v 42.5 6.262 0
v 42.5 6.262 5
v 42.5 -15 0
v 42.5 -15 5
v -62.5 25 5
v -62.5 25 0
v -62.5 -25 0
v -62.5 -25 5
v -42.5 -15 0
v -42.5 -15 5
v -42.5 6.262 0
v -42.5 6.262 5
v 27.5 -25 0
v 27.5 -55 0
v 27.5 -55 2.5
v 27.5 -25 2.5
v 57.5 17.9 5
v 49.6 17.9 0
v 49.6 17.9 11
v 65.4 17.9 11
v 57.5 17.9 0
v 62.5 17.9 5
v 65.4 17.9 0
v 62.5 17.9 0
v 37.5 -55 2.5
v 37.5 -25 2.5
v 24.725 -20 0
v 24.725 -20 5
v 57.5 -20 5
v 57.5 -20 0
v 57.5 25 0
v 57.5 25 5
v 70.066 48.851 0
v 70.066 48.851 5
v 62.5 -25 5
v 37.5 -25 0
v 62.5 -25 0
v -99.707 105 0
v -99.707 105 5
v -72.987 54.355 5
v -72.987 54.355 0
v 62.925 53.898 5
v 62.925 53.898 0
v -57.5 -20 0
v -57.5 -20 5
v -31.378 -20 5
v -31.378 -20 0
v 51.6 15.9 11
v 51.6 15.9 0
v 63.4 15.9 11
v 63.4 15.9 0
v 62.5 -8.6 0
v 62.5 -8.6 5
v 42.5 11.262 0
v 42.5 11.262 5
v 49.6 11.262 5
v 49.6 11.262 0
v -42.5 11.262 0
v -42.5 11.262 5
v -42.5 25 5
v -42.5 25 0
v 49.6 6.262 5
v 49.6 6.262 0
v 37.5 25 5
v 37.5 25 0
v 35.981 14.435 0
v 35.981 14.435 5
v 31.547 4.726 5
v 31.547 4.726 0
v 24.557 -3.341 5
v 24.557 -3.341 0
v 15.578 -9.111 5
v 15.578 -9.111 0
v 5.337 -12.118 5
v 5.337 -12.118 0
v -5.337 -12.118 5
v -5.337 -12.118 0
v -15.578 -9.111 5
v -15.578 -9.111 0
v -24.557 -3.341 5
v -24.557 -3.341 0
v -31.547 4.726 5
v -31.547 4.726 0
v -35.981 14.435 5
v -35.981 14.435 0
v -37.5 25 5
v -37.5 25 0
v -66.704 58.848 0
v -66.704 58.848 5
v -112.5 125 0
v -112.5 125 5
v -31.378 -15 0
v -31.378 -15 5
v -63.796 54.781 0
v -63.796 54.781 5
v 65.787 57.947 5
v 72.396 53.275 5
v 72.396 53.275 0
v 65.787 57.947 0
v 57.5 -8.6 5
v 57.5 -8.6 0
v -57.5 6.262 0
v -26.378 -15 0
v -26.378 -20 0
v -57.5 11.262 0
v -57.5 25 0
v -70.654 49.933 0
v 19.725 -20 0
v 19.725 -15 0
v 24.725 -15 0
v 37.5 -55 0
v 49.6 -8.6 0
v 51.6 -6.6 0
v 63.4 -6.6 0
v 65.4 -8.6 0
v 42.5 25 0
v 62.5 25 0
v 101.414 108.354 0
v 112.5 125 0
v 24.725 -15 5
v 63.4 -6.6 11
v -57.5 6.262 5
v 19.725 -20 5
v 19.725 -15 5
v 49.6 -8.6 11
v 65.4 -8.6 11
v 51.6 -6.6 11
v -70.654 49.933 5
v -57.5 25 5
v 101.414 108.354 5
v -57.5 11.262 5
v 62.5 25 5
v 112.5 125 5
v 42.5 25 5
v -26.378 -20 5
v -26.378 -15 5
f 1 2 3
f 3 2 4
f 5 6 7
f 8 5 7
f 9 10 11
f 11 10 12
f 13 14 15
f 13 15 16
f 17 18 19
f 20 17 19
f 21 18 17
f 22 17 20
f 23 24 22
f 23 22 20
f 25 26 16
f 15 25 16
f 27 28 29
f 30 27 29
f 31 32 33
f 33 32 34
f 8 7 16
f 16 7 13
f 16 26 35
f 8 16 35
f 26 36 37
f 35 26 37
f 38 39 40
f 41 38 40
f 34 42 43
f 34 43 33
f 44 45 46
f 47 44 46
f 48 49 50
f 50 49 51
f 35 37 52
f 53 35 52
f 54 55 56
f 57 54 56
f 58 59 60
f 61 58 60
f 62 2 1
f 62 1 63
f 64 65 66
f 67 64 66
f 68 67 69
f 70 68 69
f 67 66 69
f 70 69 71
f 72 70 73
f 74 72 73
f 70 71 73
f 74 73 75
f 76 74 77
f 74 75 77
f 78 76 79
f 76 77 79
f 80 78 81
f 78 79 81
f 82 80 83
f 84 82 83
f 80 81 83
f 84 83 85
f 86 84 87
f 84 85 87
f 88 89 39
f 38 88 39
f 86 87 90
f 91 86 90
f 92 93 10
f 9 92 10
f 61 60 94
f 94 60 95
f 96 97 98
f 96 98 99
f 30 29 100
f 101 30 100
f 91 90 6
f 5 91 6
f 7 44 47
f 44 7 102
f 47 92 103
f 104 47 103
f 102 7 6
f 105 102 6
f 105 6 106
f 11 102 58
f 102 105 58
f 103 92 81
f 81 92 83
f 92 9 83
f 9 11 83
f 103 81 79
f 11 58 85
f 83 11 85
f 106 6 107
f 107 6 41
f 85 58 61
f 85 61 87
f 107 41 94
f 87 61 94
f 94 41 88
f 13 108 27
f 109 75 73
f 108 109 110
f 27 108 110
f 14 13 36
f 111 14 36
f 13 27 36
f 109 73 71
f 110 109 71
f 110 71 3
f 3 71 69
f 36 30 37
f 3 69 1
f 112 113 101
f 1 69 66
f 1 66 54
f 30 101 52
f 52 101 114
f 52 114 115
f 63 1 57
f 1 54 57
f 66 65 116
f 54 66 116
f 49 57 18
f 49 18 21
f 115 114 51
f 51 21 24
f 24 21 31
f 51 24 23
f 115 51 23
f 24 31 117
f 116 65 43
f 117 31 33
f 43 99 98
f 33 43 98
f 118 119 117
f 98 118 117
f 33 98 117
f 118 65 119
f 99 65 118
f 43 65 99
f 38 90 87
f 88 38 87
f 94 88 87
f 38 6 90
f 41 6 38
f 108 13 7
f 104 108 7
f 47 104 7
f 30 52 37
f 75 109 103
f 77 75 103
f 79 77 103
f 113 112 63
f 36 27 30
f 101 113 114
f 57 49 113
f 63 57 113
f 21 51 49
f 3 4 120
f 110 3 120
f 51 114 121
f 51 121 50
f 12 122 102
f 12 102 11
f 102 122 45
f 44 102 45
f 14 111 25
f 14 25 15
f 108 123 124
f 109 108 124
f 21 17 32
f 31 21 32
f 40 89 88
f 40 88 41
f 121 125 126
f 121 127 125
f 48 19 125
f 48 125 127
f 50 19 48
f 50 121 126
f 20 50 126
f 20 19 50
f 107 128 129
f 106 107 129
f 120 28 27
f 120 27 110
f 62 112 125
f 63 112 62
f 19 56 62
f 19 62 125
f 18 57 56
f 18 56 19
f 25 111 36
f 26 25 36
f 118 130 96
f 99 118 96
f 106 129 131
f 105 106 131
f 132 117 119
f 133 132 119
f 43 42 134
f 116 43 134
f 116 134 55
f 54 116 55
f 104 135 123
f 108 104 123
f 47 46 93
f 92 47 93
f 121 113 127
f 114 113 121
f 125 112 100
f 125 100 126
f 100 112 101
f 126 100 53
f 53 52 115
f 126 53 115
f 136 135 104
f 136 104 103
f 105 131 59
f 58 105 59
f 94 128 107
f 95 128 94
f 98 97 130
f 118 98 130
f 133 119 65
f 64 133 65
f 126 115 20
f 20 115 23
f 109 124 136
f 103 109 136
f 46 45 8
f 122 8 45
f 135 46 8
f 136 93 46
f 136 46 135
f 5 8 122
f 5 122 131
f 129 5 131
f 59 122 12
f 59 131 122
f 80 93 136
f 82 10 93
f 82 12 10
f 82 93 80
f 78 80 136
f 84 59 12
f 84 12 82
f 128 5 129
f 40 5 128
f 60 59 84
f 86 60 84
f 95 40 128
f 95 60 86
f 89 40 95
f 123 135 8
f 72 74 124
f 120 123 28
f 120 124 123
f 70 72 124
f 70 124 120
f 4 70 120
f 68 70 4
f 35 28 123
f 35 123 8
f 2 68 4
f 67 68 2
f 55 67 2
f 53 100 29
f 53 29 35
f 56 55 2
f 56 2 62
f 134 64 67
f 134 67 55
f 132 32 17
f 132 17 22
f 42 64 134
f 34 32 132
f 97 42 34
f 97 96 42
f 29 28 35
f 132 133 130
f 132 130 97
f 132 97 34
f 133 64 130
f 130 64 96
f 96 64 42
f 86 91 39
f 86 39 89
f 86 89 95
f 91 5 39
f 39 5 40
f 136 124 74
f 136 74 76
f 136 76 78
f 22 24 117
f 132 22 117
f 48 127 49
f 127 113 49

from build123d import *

# Parameters (mm, degrees)
BOSS_EXTRUDE1_DEPTH = 5
CUT_EXTRUDE1_DEPTH  = 10
SKETCH3_W           = 5
SKETCH3_H           = 5
SKETCH3_W_2         = 15
BOSS_EXTRUDE2_DEPTH = 5
SKETCH5_W           = 10
SKETCH5_H           = 30
BOSS_EXTRUDE3_DEPTH = 2.5
SKETCH6_W           = 5.9
SKETCH6_H           = 4.637740471
SKETCH6_H_2         = 12.862259529
SKETCH6_W_2         = 5
SKETCH6_H_3         = 2
SKETCH6_W_3         = 2
SKETCH6_H_4         = 3.737740471
SKETCH6_H_5         = 1.262259529
BOSS_EXTRUDE6_DEPTH = 5
SKETCH7_W           = 0.9
SKETCH7_H           = 22.5
BOSS_EXTRUDE7_DEPTH = 5
SKETCH8_W           = 11.8
SKETCH8_H           = 22.5
CUT_EXTRUDE2_DEPTH  = 5
SKETCH9_W           = 15.8
SKETCH9_H           = 26.5
SKETCH9_W_2         = 11.8
SKETCH9_H_2         = 22.5
BOSS_EXTRUDE8_DEPTH = 6


with BuildPart() as part:
    # Sketch1 → Boss-Extrude1 (new body)
    with BuildSketch(Plane.XY):
        Polygon((-37.5, 25), (-112.5, 125), (-62.5, 25), align=None)
        with BuildLine():
            Line((-37.5, 25), (-62.5, 25))
            Line((-62.5, 25), (-62.5, -25))
            Line((-62.5, -25), (62.5, -25))
            Line((62.5, -25), (62.5, 25))
            Line((62.5, 25), (37.5, 25))
            ThreePointArc((37.5, 25), (0, -12.5), (-37.5, 25))
        make_face()
        Polygon((112.5, 125), (37.5, 25), (62.5, 25), align=None)
    extrude(amount=BOSS_EXTRUDE1_DEPTH)

    # Sketch2 → Cut-Extrude1 (cut)
    with BuildSketch(Plane.XY.offset(5)):
        Polygon((42.5, -15), (-42.5, -15), (-42.5, 25), (-57.5, 25), (-57.5, -20), (57.5, -20), (57.5, 25), (42.5, 25), align=None)
        Polygon((-57.5, 25), (-42.5, 25), (-99.706643081, 105), align=None)
        Polygon((101.413859584, 108.353754457), (42.5, 25), (57.5, 25), align=None)
    extrude(amount=-CUT_EXTRUDE1_DEPTH, mode=Mode.SUBTRACT)

    # Sketch3 → Boss-Extrude2 (add)
    with BuildSketch(Plane.XY.offset(5)):
        with Locations((-28.877625422, -17.5)):
            Rectangle(SKETCH3_W, SKETCH3_H)
        with Locations((22.225490127, -17.5)):
            Rectangle(SKETCH3_W, SKETCH3_H)
        with Locations((50, 8.762259529)):
            Rectangle(SKETCH3_W_2, SKETCH3_H)
        with Locations((-50, 8.762259529)):
            Rectangle(SKETCH3_W_2, SKETCH3_H)
        Polygon((-70.654305037, 49.93314621), (-63.796030498, 54.781199316), (-66.704368337, 58.848332338), (-72.987424539, 54.355425418), align=None)
        Polygon((65.786619226, 57.946867762), (62.925217298, 53.89843849), (70.065851227, 48.851487608), (72.396389437, 53.275127699), align=None)
    extrude(amount=-BOSS_EXTRUDE2_DEPTH)

    # Sketch5 → Boss-Extrude3 (add)
    with BuildSketch(Plane(origin=(0, 0, 0), x_dir=(-1, 0, 0), z_dir=(0, 0, -1))):
        with Locations((-32.5, -40)):
            Rectangle(SKETCH5_W, SKETCH5_H)
    extrude(amount=-BOSS_EXTRUDE3_DEPTH)

    # Sketch6 → Boss-Extrude6 (add)
    with BuildSketch(Plane.XY.offset(5)):
        with Locations((54.55, 13.581129765)):
            Rectangle(SKETCH6_W, SKETCH6_H)
        Polygon((51.6, 11.262259529), (51.6, 10), (57.5, 10), (62.5, 10), (62.5, 15.9), (57.5, 15.9), (57.5, 11.262259529), align=None)
        Polygon((57.5, 10), (51.6, 10), (51.6, 6.262259529), (57.5, 6.262259529), (57.5, -6.6), (62.5, -6.6), (62.5, 10), align=None)
        with Locations((54.55, -0.168870236)):
            Rectangle(SKETCH6_W, SKETCH6_H_2)
        Polygon((63.4, 15.9), (63.4, 10), (63.4, -6.6), (62.5, -6.6), (62.5, -8.6), (65.4, -8.6), (65.4, 17.9), (62.5, 17.9), (62.5, 15.9), align=None)
        with Locations((60, 16.9)):
            Rectangle(SKETCH6_W_2, SKETCH6_H_3)
        Polygon((49.6, 11.262259529), (51.6, 11.262259529), (51.6, 15.9), (57.5, 15.9), (57.5, 17.9), (49.6, 17.9), align=None)
        Polygon((51.6, -6.6), (51.6, 6.262259529), (49.6, 6.262259529), (49.6, -8.6), (57.5, -8.6), (57.5, -6.6), align=None)
        with Locations((60, -7.6)):
            Rectangle(SKETCH6_W_2, SKETCH6_H_3)
        with Locations((50.6, 8.131129765)):
            Rectangle(SKETCH6_W_3, SKETCH6_H_4)
        with Locations((50.6, 10.631129765)):
            Rectangle(SKETCH6_W_3, SKETCH6_H_5)
    extrude(amount=-BOSS_EXTRUDE6_DEPTH)

    # Sketch7 → Boss-Extrude7 (add)
    with BuildSketch(Plane.XY.offset(5)):
        with Locations((62.95, 4.65)):
            Rectangle(SKETCH7_W, SKETCH7_H)
    extrude(amount=-BOSS_EXTRUDE7_DEPTH)

    # Sketch8 → Cut-Extrude2 (cut)
    with BuildSketch(Plane.XY.offset(5)):
        with Locations((57.5, 4.65)):
            Rectangle(SKETCH8_W, SKETCH8_H)
    extrude(amount=-CUT_EXTRUDE2_DEPTH, mode=Mode.SUBTRACT)

    # Sketch9 → Boss-Extrude8 (add)
    with BuildSketch(Plane.XY.offset(5)):
        with Locations((57.5, 4.65)):
            Rectangle(SKETCH9_W, SKETCH9_H)
        with Locations((57.5, 4.65)):
            Rectangle(SKETCH9_W_2, SKETCH9_H_2, mode=Mode.SUBTRACT)
    extrude(amount=BOSS_EXTRUDE8_DEPTH)


solid = part.part
